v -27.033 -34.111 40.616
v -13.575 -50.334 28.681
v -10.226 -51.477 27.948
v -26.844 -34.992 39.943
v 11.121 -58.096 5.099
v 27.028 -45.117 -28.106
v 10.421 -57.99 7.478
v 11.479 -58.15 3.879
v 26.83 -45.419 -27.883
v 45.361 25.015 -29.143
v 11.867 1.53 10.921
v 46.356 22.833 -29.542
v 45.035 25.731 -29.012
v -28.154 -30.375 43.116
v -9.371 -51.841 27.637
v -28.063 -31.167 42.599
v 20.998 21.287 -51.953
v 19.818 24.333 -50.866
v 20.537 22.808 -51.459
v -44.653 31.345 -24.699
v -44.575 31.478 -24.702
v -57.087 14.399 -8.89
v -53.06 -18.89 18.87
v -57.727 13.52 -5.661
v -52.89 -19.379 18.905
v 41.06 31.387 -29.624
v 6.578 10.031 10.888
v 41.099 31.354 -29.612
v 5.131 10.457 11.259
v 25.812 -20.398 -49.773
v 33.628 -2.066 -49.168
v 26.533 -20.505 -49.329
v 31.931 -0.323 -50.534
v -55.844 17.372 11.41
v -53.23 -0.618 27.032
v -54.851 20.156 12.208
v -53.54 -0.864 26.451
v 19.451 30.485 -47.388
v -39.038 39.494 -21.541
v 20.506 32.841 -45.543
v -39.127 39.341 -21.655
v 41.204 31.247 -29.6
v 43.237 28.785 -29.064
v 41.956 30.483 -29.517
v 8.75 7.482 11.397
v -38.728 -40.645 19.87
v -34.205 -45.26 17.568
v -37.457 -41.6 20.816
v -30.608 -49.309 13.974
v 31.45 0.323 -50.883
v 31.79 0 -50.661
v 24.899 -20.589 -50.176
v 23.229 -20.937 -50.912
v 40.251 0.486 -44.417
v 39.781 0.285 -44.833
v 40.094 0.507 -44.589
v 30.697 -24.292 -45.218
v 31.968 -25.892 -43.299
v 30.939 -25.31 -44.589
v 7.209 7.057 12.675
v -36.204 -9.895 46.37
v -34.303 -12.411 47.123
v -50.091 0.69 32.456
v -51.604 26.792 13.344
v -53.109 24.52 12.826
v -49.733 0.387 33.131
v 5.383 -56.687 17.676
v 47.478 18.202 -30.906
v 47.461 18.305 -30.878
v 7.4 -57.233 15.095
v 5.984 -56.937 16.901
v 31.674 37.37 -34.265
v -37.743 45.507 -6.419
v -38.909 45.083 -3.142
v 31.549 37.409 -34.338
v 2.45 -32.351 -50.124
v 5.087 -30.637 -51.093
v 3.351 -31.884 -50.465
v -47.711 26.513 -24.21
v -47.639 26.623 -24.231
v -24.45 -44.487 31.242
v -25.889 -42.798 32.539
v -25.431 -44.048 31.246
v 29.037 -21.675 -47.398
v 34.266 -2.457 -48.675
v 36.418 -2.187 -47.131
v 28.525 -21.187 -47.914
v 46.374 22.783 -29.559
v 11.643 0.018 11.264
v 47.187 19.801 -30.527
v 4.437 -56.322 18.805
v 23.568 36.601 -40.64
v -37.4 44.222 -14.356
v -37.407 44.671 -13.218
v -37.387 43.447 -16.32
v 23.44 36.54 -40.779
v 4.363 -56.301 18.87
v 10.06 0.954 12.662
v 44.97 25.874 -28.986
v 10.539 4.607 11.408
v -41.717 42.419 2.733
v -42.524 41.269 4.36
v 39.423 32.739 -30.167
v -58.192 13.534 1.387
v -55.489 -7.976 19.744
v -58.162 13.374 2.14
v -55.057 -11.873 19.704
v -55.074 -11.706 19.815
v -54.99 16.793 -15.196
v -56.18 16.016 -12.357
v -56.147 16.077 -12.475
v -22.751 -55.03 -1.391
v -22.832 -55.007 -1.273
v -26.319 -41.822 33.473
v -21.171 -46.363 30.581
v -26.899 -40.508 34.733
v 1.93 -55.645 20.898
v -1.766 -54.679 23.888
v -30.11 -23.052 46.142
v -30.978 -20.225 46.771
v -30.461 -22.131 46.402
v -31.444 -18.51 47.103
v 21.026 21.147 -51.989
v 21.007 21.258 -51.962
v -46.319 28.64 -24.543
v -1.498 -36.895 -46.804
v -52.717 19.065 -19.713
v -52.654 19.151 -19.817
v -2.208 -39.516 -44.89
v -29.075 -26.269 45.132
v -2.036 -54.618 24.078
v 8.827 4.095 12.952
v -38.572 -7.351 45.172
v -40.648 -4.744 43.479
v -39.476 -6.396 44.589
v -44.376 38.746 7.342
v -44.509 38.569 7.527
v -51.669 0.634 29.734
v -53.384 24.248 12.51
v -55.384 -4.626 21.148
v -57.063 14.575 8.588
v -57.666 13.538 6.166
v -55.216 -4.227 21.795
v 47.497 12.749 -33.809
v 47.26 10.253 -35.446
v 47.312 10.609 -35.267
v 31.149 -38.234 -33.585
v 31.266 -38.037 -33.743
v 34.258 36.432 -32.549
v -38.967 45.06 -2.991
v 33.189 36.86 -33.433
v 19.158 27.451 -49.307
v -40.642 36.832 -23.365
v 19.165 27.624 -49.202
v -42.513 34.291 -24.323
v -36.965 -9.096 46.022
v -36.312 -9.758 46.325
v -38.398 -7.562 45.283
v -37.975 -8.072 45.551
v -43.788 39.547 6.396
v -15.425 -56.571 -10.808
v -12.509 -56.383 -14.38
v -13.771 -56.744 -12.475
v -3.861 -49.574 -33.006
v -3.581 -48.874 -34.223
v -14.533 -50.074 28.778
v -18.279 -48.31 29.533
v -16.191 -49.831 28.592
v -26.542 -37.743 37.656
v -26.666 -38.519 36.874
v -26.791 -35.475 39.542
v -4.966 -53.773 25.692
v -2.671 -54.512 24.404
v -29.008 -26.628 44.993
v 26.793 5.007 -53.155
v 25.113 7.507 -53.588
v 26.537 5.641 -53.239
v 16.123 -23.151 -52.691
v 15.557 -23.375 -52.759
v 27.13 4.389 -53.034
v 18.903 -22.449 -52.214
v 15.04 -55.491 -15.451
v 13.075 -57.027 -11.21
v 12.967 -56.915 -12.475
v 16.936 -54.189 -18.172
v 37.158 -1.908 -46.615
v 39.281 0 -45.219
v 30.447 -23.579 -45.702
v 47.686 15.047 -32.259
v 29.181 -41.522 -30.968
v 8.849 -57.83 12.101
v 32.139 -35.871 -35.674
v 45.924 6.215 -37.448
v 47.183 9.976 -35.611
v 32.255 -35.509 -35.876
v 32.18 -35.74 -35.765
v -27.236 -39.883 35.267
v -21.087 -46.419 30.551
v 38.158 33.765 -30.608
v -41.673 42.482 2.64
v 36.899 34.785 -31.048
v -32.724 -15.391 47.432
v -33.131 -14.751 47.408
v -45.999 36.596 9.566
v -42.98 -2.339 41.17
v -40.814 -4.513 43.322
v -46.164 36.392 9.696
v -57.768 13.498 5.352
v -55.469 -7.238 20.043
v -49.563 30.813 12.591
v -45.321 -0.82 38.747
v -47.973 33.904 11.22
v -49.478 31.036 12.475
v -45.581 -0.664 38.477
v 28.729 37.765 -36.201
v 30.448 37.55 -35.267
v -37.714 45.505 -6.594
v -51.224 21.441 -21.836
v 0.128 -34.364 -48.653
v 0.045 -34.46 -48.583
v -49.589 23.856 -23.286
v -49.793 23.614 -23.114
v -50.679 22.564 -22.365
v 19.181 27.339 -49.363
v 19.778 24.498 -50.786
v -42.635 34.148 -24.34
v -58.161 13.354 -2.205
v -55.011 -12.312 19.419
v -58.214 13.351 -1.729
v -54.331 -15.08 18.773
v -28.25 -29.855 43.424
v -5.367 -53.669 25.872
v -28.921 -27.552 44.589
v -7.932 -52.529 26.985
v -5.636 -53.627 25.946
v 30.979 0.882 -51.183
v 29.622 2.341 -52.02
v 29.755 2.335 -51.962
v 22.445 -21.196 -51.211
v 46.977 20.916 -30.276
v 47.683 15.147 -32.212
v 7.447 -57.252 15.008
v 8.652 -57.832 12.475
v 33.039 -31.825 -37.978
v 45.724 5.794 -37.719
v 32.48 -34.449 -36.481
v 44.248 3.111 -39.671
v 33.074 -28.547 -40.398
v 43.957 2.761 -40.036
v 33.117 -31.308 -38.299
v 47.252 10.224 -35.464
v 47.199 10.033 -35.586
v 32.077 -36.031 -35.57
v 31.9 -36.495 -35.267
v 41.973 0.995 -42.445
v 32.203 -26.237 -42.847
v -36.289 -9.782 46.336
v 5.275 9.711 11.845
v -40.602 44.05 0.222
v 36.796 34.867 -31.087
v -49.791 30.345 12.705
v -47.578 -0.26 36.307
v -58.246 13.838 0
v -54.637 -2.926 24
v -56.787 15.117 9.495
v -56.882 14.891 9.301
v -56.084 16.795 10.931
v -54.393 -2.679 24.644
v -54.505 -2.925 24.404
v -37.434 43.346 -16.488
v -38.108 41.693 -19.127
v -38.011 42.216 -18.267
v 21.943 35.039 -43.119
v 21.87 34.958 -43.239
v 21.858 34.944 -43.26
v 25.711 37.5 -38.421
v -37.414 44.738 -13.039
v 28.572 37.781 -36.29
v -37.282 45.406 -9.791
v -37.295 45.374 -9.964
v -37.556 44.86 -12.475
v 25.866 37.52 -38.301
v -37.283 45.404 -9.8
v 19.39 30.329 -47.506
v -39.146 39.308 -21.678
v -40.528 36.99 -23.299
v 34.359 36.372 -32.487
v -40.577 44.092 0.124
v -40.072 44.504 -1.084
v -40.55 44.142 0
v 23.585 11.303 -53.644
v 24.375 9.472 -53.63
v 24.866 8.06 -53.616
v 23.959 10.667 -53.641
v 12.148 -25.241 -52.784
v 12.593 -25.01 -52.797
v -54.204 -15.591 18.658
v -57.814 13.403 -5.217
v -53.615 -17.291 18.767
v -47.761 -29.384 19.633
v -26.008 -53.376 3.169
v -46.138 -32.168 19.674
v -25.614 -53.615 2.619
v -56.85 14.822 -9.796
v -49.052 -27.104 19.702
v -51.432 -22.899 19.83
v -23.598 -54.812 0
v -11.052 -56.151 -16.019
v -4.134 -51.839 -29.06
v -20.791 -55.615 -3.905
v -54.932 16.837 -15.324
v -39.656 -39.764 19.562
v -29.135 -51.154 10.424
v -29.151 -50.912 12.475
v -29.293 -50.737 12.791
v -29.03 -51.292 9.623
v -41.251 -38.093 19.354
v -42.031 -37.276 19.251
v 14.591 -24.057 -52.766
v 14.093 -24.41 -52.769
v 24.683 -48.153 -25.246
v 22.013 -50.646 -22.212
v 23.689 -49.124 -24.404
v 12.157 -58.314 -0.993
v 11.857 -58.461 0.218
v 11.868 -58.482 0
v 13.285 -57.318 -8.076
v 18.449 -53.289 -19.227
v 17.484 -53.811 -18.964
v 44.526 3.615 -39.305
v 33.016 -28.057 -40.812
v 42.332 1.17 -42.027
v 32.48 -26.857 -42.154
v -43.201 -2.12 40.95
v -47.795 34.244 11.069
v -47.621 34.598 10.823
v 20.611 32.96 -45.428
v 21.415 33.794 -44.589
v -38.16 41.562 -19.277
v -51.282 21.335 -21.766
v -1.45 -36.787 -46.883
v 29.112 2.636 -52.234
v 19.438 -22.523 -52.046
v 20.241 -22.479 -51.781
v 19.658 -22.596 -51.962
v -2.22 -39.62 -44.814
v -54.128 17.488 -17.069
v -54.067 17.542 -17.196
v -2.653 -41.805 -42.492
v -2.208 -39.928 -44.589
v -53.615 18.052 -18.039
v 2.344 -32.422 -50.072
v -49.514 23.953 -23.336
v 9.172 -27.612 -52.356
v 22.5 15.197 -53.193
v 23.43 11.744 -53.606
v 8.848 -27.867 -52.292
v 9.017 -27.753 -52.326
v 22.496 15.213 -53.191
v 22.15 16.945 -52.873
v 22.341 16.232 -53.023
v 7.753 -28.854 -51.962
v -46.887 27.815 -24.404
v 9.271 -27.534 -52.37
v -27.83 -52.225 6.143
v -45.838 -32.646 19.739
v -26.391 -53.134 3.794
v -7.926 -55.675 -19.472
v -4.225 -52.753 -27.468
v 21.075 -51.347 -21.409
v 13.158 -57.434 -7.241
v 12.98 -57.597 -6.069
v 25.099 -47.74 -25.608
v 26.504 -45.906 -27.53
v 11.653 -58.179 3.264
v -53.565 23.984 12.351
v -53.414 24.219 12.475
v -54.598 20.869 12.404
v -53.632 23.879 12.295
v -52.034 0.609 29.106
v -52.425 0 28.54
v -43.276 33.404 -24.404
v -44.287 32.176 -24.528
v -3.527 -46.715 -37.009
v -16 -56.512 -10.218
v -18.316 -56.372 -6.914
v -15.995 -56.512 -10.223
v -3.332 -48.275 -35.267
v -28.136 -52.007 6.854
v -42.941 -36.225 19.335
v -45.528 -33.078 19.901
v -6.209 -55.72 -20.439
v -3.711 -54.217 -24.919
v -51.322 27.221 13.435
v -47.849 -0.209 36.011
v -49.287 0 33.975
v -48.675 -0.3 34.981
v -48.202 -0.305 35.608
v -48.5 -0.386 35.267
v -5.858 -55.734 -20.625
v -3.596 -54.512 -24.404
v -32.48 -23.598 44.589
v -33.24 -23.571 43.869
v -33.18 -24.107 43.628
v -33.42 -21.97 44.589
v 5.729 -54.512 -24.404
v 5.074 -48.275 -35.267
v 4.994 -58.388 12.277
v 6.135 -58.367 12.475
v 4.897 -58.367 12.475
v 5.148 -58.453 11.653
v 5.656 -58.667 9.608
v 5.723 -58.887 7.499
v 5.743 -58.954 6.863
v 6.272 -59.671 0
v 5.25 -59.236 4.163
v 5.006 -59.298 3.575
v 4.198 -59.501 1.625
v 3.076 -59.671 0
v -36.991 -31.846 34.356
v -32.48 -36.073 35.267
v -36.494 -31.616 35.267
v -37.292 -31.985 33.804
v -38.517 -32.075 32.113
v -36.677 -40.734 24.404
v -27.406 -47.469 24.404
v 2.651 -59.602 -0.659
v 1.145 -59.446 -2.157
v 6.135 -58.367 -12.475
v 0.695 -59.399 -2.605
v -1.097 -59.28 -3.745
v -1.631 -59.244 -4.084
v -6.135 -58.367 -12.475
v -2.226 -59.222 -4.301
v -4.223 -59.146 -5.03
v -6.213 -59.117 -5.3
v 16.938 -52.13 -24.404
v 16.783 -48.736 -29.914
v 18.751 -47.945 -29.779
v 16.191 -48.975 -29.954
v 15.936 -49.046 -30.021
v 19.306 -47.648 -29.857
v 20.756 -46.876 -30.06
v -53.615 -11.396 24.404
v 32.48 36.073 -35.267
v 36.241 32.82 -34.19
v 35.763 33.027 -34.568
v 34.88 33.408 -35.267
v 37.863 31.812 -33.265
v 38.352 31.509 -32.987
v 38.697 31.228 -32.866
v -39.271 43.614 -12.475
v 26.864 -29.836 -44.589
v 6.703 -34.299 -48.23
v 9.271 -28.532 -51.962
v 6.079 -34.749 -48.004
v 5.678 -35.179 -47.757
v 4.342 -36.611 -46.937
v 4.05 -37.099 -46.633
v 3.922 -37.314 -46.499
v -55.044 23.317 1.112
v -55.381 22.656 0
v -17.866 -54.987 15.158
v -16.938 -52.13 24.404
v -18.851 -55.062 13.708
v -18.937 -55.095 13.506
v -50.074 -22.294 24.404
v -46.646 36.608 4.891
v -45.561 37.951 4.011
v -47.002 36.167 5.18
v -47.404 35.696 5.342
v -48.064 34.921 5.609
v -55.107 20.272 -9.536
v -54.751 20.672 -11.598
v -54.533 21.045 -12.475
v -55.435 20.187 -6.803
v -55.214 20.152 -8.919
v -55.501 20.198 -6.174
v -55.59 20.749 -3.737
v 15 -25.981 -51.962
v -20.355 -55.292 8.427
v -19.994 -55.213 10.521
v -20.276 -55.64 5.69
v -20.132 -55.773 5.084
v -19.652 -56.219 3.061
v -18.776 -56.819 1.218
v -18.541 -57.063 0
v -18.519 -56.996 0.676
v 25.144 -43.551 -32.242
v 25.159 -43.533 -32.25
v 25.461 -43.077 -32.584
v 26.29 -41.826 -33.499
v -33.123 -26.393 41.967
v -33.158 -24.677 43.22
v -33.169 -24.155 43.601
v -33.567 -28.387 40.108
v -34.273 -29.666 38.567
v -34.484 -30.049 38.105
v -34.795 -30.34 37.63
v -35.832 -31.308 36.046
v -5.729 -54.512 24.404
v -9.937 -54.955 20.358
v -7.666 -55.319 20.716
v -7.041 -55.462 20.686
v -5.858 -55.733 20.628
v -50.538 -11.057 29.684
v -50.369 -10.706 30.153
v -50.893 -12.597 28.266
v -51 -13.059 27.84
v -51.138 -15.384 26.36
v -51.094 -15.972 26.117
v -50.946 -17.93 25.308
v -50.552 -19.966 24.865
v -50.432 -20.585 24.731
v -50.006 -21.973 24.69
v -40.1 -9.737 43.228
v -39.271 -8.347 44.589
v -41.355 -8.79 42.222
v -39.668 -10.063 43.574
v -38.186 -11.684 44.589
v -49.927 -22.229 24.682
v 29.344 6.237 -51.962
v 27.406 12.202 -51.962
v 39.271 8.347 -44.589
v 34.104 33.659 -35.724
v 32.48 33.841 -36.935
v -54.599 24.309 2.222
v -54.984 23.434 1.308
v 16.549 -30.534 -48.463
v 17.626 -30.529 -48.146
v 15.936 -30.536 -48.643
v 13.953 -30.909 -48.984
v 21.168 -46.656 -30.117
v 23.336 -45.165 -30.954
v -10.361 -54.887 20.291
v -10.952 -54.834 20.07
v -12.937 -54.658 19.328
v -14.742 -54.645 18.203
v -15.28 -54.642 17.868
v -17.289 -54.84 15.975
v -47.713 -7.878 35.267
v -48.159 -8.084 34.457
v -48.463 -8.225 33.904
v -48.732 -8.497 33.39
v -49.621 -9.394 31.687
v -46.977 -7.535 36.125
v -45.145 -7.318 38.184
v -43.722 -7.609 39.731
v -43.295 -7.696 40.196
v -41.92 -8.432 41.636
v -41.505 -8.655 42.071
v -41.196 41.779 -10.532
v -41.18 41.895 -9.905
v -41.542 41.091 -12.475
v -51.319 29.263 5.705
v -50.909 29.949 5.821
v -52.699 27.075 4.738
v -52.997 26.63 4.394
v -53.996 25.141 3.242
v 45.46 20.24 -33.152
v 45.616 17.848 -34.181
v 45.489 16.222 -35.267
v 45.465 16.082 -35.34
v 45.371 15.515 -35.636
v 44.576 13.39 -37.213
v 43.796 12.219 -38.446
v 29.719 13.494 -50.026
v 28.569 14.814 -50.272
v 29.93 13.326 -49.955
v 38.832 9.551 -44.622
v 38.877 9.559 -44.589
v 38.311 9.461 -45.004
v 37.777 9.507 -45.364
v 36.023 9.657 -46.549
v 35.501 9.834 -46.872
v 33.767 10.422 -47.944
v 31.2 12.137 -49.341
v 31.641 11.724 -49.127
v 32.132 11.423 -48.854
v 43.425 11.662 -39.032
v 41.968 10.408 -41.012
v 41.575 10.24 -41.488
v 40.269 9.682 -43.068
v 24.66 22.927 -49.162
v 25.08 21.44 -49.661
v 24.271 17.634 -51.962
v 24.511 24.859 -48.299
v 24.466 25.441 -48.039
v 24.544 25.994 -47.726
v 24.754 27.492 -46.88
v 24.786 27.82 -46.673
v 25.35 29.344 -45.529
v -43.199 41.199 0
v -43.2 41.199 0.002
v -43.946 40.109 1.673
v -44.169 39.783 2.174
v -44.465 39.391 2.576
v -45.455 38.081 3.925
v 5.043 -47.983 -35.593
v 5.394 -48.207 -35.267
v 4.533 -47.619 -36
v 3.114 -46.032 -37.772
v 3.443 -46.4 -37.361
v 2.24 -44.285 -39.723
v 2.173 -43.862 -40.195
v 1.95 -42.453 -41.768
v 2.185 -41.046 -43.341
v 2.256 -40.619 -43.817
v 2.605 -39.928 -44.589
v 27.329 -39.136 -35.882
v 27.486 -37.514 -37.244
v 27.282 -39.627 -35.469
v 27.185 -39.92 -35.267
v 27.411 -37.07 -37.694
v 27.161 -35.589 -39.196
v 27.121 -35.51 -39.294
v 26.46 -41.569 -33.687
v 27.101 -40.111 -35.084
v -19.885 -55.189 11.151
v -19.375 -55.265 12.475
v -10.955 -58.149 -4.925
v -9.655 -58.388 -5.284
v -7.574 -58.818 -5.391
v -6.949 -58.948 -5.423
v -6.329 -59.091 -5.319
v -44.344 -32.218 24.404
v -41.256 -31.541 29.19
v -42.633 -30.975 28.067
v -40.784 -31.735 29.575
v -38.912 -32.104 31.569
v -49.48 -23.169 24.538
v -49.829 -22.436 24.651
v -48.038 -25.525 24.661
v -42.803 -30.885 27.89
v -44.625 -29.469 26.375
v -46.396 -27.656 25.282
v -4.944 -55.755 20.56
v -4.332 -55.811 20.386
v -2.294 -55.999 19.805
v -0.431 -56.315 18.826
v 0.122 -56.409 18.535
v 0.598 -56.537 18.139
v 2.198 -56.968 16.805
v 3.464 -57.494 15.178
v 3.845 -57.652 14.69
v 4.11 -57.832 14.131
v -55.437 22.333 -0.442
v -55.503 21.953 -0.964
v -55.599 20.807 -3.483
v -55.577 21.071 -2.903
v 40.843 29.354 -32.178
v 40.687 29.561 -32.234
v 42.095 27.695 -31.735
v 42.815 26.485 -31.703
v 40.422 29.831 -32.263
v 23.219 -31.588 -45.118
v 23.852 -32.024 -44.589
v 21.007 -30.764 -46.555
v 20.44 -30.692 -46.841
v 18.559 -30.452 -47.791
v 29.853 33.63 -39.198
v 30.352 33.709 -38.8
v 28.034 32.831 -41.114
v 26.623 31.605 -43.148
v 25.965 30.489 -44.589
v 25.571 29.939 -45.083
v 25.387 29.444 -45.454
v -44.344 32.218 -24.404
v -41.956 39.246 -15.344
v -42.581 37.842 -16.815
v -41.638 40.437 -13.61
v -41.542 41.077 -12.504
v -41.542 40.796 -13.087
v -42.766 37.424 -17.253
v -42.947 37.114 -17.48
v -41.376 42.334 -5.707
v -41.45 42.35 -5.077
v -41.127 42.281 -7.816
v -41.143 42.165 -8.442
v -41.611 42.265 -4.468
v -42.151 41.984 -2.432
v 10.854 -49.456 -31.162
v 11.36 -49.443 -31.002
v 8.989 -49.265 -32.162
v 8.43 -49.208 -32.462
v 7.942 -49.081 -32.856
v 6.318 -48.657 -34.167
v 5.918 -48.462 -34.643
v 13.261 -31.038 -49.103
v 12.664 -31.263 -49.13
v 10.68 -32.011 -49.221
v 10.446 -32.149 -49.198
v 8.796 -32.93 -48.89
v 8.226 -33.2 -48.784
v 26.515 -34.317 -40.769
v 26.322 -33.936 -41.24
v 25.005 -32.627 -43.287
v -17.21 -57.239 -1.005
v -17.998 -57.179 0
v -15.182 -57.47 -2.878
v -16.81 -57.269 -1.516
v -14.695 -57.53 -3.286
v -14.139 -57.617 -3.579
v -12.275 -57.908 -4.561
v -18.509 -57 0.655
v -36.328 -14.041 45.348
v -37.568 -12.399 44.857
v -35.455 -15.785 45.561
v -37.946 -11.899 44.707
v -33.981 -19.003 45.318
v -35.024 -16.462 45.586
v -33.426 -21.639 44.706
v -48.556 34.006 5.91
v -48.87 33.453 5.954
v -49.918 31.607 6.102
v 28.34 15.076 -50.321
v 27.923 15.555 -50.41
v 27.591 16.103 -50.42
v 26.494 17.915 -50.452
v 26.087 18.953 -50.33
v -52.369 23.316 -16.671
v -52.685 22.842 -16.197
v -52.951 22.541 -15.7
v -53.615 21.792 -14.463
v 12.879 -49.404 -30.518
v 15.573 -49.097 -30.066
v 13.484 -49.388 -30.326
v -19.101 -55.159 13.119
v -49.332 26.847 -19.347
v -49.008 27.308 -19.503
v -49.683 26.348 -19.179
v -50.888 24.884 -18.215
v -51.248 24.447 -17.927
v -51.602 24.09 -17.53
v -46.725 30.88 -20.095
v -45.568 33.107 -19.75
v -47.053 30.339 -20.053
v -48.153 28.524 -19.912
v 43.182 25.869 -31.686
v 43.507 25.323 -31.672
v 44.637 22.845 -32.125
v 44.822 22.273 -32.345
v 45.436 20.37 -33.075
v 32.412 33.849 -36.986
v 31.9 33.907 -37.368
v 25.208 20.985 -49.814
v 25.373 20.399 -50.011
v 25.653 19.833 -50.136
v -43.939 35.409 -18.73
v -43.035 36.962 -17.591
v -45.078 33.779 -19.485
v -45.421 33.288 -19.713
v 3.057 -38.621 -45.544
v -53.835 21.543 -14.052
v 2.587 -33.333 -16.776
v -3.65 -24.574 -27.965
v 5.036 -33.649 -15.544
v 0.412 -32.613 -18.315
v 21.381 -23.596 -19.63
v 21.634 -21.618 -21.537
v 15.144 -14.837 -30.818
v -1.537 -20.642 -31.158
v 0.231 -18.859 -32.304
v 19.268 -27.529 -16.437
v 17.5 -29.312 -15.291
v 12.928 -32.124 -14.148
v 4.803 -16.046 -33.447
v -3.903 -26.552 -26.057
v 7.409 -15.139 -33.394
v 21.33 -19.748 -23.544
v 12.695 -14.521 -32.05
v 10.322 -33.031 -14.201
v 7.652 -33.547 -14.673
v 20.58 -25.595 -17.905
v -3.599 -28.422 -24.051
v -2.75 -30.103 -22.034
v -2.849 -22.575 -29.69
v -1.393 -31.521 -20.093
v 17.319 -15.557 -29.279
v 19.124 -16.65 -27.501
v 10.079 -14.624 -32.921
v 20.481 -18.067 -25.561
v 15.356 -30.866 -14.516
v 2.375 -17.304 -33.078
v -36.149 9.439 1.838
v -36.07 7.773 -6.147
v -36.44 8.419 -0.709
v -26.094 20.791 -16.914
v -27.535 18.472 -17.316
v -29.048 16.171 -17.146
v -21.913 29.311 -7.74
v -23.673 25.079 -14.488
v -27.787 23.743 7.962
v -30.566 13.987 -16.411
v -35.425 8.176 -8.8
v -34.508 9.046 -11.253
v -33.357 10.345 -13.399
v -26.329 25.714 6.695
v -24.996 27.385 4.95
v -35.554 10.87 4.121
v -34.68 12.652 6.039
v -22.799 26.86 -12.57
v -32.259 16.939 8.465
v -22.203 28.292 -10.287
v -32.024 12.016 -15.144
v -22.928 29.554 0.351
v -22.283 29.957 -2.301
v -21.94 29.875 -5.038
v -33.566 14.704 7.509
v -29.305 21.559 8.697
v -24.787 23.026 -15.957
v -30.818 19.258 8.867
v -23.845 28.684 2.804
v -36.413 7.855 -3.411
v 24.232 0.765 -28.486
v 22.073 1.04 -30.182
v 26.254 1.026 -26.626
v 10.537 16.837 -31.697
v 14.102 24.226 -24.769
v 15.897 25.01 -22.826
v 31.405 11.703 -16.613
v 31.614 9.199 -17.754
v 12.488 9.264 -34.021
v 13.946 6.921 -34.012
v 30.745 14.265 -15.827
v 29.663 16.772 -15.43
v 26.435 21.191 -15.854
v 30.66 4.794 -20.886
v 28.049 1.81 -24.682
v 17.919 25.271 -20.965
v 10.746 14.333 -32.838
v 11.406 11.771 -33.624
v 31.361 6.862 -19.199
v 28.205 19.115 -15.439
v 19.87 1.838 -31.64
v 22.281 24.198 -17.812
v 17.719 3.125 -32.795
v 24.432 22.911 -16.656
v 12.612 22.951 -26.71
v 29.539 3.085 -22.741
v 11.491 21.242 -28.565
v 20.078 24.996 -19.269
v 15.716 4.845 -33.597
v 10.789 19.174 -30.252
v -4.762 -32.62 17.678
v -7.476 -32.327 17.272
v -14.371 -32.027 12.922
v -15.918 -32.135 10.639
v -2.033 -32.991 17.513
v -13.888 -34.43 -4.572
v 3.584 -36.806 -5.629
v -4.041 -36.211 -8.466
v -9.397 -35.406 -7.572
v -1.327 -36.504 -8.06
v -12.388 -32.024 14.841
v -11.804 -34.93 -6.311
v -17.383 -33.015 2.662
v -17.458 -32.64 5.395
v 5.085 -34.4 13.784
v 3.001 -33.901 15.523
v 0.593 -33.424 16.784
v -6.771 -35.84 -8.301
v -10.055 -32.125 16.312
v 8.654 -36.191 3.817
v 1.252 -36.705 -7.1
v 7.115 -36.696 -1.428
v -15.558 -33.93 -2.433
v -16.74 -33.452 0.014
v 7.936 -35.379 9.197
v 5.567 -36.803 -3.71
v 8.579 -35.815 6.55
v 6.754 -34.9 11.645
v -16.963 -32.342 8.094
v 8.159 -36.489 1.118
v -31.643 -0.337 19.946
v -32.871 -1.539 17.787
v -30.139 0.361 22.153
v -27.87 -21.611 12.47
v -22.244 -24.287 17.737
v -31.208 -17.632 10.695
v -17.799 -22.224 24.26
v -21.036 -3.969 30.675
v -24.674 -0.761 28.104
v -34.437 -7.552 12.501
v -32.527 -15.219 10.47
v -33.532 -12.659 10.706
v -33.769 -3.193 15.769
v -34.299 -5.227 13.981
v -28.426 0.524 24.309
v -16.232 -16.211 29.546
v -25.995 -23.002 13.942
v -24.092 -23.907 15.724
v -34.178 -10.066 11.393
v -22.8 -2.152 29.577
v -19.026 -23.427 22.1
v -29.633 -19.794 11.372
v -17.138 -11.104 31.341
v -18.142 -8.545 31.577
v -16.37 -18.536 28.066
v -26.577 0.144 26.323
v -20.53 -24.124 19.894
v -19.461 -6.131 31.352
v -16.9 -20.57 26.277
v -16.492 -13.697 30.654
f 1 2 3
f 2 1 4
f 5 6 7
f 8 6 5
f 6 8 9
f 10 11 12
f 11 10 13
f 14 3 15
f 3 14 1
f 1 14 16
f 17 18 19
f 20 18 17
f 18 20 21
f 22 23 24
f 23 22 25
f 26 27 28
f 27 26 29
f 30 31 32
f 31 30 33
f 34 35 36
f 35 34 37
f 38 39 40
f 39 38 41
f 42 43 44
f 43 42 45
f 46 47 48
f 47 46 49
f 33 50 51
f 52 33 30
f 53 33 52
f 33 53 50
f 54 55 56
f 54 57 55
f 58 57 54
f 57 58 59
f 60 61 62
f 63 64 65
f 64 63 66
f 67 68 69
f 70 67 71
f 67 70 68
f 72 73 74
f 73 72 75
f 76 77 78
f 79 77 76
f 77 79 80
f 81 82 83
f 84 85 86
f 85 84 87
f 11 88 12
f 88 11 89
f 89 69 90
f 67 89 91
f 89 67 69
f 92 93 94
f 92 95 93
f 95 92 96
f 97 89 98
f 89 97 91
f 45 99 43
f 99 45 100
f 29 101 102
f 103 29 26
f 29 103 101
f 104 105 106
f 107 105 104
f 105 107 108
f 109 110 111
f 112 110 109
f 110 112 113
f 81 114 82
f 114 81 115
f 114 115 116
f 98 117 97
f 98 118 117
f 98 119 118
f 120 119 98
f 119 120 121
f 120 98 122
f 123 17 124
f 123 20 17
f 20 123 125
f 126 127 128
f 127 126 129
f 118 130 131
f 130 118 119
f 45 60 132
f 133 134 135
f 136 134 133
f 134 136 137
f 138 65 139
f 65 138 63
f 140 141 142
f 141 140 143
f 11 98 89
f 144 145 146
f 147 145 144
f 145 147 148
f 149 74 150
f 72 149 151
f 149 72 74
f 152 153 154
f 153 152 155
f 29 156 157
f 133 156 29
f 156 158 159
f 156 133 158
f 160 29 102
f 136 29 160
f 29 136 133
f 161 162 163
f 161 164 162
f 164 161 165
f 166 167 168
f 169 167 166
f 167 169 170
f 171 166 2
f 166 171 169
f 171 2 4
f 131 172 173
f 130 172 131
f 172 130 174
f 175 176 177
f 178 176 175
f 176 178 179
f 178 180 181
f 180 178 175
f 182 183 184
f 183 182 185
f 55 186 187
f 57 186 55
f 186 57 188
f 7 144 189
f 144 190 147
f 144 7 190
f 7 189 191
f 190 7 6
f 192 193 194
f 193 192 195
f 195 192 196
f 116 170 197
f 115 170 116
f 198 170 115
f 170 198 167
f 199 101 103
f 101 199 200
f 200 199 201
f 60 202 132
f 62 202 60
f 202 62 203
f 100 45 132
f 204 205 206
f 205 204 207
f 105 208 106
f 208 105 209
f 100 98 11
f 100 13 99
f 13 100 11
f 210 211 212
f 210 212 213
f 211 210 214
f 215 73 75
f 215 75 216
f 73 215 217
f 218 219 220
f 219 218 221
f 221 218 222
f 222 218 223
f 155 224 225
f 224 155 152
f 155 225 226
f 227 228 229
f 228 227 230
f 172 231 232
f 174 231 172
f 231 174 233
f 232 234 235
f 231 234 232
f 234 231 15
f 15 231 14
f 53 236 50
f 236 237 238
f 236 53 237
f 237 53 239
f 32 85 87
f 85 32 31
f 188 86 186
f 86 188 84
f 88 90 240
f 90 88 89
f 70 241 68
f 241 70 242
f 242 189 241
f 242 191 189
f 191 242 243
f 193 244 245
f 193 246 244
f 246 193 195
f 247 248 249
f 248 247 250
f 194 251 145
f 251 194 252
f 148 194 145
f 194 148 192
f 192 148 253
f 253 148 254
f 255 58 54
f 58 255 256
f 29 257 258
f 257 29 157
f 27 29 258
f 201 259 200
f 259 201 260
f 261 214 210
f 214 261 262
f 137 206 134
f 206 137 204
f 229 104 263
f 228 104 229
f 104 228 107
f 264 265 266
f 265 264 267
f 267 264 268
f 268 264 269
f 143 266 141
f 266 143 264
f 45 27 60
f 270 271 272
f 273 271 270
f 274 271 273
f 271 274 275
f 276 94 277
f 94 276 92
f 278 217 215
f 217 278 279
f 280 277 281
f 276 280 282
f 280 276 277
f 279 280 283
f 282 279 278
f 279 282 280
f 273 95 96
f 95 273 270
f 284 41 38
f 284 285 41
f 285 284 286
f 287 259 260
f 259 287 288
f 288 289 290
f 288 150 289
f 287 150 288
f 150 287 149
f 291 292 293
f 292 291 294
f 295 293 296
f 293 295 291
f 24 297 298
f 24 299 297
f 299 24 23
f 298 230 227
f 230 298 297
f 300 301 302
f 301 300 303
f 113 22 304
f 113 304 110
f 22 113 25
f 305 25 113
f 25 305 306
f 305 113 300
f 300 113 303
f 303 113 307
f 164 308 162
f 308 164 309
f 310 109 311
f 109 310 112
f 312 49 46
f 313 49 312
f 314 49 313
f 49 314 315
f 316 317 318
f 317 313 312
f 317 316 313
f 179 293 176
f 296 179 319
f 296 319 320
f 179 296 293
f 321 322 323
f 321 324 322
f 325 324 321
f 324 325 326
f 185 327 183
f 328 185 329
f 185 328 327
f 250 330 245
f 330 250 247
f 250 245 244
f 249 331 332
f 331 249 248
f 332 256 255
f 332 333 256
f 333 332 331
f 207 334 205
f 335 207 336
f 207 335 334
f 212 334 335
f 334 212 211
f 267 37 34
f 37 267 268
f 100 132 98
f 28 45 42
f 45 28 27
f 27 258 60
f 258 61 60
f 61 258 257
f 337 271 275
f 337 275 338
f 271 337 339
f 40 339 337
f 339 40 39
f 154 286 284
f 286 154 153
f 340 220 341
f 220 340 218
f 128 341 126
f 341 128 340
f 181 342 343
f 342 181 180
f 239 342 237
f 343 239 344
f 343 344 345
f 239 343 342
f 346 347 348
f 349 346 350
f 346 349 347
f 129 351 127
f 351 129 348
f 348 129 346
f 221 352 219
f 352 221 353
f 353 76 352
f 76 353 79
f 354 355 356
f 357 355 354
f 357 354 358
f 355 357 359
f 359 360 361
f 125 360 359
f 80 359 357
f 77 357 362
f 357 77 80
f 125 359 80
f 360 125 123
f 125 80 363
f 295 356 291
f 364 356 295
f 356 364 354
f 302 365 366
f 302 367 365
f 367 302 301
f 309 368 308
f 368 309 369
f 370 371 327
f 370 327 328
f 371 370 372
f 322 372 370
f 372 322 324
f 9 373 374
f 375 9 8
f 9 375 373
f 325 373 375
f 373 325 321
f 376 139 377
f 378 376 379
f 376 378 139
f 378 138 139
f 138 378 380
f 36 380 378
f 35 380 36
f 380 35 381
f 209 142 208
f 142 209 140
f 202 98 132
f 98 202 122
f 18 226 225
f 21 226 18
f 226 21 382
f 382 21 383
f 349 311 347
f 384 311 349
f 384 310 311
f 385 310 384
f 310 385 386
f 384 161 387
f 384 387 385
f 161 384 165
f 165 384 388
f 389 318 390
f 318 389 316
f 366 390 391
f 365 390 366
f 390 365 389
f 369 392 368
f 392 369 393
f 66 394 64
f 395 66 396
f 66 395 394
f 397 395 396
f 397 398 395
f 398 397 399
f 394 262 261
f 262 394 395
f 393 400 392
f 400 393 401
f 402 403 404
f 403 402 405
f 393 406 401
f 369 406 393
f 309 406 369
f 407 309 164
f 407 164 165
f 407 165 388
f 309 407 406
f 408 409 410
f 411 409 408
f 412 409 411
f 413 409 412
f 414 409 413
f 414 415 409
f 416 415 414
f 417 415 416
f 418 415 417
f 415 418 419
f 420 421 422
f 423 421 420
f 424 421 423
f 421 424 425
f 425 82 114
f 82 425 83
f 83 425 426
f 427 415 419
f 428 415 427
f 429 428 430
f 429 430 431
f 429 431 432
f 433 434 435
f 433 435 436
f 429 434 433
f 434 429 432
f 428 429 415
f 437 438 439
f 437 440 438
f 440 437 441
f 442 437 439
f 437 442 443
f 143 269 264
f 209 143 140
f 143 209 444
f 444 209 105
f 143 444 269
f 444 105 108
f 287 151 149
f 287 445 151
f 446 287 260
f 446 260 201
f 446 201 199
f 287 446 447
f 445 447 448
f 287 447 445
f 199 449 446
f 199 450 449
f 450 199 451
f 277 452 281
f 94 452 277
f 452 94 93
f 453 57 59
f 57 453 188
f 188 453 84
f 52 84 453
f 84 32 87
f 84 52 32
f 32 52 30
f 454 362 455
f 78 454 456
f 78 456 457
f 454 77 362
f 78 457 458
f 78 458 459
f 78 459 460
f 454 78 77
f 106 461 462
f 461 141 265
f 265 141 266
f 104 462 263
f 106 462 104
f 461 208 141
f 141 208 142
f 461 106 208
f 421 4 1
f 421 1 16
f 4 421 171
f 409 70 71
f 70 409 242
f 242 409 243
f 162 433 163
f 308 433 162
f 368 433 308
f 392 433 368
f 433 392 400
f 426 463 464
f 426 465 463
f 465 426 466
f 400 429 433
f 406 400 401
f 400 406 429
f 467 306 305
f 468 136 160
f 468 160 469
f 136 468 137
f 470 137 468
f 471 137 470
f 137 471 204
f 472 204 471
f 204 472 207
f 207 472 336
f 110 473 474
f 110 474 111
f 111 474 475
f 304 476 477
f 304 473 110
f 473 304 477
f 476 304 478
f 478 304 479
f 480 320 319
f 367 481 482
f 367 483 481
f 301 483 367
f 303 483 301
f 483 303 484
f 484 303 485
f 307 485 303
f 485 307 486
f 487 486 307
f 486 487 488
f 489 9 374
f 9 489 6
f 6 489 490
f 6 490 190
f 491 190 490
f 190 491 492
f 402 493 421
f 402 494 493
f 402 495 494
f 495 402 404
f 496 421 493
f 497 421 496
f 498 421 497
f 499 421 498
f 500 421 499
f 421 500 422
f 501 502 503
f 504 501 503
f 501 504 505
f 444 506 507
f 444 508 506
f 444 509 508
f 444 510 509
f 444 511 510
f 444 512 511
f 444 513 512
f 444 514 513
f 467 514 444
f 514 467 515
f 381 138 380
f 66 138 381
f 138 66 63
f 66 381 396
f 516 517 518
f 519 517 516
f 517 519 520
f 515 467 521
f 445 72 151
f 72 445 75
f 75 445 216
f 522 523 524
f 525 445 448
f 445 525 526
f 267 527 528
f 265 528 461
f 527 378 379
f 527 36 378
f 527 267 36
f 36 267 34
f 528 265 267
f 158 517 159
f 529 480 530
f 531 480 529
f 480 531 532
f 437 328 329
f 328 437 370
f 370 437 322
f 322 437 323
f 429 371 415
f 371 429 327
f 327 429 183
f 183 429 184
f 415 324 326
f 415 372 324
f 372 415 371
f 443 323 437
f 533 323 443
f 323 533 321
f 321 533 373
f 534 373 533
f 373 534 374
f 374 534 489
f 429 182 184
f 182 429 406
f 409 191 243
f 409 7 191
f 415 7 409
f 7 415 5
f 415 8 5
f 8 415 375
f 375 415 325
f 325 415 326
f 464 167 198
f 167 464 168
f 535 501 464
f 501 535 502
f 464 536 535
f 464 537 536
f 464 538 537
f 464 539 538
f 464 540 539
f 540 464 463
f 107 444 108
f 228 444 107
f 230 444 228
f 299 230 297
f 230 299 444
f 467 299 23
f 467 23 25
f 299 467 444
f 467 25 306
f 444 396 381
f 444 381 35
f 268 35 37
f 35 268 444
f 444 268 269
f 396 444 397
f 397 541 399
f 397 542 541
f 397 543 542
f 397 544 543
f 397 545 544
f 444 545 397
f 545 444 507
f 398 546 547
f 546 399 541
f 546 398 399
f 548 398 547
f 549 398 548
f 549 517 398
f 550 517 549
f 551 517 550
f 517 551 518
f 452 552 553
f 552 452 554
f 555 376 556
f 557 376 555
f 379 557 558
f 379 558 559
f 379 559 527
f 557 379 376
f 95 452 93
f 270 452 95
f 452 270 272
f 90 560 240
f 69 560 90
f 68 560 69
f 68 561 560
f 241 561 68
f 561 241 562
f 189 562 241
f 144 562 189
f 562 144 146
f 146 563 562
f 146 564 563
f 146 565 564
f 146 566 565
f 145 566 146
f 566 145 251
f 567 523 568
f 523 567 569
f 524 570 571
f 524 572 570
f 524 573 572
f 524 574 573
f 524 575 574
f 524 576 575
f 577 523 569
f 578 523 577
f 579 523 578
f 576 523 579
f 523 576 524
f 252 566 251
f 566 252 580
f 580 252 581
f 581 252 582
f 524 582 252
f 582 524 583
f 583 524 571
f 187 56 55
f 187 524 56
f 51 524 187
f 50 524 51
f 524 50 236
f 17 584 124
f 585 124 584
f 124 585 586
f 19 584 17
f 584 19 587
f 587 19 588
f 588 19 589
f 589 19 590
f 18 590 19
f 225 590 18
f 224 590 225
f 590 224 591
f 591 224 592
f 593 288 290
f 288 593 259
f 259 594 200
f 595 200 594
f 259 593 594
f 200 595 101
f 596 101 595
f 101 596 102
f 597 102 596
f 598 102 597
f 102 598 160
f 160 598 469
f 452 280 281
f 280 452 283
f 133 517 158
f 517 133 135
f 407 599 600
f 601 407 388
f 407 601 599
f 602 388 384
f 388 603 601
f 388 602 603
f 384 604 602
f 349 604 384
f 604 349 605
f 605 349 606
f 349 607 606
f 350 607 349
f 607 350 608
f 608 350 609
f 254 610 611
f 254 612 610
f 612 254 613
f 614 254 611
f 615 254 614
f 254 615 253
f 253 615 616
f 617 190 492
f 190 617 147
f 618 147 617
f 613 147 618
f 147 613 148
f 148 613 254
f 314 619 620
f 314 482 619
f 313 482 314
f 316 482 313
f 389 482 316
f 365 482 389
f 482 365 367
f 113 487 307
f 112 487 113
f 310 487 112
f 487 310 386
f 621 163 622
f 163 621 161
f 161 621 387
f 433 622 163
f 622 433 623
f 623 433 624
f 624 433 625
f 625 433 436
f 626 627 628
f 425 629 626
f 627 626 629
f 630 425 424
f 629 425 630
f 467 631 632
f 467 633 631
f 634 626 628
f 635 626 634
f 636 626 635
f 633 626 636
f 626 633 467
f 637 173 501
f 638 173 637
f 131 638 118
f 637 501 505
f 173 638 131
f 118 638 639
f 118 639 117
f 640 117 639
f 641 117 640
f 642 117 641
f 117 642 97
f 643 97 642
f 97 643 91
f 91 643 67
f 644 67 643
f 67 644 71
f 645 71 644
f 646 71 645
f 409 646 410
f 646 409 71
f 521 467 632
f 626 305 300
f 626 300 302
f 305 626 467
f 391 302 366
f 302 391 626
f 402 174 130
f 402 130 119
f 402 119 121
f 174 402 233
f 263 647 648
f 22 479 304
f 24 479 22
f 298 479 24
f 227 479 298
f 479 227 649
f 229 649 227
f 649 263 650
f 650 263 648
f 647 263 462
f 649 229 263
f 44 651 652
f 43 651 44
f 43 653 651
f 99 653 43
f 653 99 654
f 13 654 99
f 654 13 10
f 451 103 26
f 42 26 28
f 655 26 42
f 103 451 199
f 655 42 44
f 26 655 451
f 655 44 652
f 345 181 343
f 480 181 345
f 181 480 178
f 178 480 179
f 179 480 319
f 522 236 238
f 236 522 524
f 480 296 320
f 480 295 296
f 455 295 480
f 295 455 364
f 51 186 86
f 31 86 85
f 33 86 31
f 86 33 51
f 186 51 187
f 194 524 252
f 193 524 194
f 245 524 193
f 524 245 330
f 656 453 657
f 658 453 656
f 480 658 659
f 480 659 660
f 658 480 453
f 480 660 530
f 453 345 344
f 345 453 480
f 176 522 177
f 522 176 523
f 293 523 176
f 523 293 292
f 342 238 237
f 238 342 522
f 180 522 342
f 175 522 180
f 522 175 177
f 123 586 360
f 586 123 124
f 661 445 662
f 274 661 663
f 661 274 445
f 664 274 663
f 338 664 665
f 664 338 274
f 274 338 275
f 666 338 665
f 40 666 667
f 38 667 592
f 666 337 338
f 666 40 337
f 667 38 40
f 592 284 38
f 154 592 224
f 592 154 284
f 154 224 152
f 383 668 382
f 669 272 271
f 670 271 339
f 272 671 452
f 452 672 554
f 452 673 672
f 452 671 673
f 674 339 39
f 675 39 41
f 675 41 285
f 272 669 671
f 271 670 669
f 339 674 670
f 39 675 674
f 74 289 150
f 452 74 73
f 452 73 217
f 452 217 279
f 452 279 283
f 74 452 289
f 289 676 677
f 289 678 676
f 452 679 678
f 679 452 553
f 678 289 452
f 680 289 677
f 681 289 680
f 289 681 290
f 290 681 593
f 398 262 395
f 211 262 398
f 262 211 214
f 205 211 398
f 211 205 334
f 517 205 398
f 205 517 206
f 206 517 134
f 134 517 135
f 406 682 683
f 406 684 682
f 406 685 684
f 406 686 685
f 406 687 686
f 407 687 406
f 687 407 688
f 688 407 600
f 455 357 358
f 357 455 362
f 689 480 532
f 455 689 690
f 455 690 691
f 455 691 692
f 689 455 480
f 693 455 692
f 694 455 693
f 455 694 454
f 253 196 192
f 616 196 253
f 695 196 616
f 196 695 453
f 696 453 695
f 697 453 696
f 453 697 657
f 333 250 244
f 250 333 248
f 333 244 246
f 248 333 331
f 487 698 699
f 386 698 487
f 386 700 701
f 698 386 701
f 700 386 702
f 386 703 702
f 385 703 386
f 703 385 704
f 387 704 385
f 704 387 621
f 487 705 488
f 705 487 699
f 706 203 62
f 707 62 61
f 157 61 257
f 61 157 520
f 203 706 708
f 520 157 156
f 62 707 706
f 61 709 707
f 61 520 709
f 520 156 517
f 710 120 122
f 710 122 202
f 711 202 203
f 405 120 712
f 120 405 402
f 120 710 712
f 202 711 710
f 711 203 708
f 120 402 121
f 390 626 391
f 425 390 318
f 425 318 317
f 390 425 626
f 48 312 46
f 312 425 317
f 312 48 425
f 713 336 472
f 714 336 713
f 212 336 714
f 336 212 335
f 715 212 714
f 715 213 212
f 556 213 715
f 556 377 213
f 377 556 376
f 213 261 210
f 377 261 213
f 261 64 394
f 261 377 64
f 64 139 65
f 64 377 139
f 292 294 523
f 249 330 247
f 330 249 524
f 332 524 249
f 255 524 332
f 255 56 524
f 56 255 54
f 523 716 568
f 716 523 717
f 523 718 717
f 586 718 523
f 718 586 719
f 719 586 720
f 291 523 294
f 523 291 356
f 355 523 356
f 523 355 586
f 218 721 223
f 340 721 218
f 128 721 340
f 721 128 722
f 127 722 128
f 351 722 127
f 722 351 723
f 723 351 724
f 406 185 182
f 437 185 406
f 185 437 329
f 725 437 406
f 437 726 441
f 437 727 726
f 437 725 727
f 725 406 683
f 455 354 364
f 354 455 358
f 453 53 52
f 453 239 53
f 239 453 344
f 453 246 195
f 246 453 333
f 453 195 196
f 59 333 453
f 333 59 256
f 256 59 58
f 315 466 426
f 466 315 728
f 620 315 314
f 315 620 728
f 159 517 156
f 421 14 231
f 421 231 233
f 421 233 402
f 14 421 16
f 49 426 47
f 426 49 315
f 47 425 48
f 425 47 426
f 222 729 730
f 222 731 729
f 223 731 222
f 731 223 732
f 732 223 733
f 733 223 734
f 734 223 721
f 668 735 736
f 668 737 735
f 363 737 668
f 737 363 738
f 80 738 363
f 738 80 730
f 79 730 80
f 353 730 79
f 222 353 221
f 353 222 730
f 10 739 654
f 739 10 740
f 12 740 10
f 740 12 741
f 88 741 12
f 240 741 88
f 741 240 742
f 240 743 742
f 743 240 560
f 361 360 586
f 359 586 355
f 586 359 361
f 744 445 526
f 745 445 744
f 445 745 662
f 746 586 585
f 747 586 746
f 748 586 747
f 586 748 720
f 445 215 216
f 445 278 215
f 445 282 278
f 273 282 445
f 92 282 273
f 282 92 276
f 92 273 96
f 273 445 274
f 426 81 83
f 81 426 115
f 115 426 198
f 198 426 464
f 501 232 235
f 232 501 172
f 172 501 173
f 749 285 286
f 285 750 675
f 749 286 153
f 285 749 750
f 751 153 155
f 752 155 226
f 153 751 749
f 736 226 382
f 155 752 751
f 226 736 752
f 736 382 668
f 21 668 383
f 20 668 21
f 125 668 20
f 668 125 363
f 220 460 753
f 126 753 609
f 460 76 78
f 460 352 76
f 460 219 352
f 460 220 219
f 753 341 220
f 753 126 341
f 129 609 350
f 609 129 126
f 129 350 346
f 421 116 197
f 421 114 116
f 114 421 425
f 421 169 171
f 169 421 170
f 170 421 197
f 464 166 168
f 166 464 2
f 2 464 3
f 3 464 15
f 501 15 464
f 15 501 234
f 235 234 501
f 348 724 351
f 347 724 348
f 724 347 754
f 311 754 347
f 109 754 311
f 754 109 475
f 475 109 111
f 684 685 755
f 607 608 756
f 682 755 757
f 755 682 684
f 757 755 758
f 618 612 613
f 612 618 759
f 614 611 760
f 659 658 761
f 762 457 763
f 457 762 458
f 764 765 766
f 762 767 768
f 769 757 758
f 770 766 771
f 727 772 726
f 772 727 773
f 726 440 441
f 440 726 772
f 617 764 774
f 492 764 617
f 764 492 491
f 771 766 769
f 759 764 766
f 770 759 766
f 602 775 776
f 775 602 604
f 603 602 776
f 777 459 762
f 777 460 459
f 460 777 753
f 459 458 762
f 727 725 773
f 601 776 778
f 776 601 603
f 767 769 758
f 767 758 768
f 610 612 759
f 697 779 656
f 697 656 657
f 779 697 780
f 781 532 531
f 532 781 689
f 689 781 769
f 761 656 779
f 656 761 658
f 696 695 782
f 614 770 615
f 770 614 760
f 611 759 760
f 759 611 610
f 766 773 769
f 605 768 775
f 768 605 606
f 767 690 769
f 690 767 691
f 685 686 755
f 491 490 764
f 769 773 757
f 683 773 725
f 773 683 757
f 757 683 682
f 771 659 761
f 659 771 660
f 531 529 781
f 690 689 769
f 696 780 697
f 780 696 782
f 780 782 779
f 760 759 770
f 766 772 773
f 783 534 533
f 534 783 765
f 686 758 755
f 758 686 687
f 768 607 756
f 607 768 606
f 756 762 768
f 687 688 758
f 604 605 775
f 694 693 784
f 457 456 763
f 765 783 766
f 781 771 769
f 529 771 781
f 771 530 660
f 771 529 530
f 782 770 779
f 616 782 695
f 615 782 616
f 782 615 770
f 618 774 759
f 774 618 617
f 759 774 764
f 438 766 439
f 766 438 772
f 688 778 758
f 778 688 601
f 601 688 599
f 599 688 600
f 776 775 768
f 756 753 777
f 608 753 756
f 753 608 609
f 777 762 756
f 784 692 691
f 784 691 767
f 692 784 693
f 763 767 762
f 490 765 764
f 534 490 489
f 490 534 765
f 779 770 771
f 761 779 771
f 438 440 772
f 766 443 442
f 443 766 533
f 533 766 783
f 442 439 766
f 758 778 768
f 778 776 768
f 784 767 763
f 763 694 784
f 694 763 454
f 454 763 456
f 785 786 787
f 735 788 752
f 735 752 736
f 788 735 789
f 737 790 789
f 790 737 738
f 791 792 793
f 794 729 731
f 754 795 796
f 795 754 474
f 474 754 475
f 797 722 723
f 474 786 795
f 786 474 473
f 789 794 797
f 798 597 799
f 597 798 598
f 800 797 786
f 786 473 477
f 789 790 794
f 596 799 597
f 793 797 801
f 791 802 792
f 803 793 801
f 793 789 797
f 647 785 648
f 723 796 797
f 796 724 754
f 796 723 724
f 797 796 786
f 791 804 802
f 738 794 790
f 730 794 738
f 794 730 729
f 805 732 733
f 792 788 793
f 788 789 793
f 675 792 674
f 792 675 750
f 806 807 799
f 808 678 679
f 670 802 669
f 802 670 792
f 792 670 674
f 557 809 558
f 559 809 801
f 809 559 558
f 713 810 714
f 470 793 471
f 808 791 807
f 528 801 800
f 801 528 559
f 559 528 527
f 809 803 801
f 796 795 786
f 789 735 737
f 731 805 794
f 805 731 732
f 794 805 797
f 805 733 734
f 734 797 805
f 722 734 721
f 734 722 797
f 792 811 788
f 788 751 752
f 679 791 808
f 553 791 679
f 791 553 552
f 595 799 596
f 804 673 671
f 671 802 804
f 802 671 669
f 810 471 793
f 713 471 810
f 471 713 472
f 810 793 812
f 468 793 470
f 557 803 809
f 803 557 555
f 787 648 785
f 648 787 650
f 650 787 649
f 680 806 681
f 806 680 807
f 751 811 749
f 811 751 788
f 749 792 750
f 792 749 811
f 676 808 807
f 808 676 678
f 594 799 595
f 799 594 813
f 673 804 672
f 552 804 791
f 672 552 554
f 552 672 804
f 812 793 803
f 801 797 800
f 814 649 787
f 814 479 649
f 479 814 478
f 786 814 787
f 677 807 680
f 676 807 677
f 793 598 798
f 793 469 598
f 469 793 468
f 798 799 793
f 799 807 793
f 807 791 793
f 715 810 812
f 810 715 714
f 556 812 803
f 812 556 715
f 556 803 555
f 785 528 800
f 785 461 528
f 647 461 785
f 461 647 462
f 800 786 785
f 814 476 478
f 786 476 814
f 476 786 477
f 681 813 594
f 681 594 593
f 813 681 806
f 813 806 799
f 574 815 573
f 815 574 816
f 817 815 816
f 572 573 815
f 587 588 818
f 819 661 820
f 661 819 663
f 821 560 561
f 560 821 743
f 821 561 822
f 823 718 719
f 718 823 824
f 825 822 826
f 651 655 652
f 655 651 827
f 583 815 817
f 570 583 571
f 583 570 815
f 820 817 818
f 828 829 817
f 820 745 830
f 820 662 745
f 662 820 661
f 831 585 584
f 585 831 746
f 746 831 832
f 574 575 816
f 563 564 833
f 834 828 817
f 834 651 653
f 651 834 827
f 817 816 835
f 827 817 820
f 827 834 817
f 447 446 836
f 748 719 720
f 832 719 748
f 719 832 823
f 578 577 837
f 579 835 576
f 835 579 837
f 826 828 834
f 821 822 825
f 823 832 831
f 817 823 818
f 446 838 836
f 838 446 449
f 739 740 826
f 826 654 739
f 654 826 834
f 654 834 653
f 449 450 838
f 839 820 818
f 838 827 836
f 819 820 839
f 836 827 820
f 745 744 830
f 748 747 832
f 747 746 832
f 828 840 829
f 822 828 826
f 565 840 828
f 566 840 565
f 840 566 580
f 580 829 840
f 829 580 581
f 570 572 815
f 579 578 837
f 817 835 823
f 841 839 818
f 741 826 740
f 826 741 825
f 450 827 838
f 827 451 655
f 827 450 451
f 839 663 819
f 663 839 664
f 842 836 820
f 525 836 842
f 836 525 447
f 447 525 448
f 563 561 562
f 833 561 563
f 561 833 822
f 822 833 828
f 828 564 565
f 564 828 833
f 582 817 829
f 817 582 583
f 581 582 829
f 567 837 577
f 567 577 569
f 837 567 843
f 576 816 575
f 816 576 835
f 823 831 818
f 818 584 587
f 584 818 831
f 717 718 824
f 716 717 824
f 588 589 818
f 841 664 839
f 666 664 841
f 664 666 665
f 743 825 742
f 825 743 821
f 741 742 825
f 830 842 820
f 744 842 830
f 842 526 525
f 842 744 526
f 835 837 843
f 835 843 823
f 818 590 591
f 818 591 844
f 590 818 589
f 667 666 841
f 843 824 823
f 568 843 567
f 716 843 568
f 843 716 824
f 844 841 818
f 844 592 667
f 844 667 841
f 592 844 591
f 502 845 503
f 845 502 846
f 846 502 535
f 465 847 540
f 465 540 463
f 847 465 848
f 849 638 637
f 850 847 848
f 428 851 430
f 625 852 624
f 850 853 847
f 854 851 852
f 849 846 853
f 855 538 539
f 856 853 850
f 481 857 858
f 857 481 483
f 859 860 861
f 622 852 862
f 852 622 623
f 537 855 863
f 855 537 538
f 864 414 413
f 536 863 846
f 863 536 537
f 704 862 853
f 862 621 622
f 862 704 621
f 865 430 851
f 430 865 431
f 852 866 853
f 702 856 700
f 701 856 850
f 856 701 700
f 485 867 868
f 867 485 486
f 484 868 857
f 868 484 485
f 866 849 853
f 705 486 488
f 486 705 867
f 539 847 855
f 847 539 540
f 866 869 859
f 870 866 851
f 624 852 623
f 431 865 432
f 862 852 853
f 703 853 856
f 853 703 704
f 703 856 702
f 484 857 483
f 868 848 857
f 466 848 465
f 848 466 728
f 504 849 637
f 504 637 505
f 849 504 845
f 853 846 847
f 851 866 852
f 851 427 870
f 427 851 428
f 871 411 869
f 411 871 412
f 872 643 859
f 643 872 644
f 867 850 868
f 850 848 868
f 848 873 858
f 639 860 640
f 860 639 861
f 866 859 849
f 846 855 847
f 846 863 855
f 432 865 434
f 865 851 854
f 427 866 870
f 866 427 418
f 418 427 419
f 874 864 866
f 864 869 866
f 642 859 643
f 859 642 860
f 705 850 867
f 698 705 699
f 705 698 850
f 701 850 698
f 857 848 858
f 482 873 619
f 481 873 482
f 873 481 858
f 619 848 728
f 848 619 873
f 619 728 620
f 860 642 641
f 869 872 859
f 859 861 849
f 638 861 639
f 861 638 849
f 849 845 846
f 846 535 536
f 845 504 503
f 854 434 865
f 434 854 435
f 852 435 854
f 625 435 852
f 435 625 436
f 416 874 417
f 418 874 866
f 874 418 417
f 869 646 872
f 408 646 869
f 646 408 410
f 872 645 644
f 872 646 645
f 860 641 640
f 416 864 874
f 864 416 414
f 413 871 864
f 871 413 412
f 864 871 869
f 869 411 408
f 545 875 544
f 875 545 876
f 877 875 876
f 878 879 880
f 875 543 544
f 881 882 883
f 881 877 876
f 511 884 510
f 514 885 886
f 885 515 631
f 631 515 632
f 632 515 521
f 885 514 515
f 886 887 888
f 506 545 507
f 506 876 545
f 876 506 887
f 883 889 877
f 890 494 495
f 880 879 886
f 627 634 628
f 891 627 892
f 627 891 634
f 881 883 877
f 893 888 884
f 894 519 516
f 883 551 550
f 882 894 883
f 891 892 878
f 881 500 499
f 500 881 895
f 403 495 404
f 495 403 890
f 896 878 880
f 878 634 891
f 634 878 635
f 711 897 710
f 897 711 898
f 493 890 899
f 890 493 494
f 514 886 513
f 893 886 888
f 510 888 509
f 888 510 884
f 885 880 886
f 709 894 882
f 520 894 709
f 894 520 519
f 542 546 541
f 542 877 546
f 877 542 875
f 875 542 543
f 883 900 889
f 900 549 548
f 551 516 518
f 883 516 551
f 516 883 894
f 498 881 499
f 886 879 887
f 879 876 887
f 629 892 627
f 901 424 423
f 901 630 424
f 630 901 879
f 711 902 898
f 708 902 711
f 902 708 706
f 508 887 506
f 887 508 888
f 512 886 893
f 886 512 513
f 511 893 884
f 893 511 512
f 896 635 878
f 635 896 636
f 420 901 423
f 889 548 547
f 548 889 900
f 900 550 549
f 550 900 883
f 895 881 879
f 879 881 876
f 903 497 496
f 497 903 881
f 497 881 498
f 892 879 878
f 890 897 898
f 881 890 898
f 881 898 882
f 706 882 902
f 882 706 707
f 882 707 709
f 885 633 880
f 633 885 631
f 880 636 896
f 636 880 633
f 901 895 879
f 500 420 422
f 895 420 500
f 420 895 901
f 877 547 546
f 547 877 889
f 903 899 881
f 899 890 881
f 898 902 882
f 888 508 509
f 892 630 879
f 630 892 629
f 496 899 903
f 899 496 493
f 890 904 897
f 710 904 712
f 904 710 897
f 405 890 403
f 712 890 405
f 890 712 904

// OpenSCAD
difference() {
	intersection() {
		hull() {
			rotate(a = -120.3141209556, v = [0.6897763572, -0.5190815997, 0.0000000000]) {
				rotate(a = -90.0000000000, v = [0.2588190451, -0.9659258263, 0.0000000000]) {
					cylinder(h = 60, r = 16.2000000000);
				}
			}
			rotate(a = -120.3141209556, v = [0.6897763572, -0.5190815997, 0.0000000000]) {
				rotate(a = -90.0000000000, v = [0.7071067812, 0.7071067812, -0.0000000000]) {
					cylinder(h = 60, r = 16.2000000000);
				}
			}
			rotate(a = -120.3141209556, v = [0.6897763572, -0.5190815997, 0.0000000000]) {
				rotate(a = -22.2263282801, v = [0.0665799897, -0.3723606073, 0.0000000000]) {
					cylinder(h = 60, r = 16.2000000000);
				}
			}
			rotate(a = -120.3141209556, v = [0.6897763572, -0.5190815997, 0.0000000000]) {
				rotate(a = -144.0917087294, v = [-0.0385041896, -0.5852242691, 0.0000000000]) {
					cylinder(h = 60, r = 16.2000000000);
				}
			}
			rotate(a = -120.3141209556, v = [0.6897763572, -0.5190815997, 0.0000000000]) {
				rotate(a = -155.9342565737, v = [0.0956376174, 0.3964110704, -0.0000000000]) {
					cylinder(h = 60, r = 16.2000000000);
				}
			}
		}
		sphere(r = 60);
	}
	union() {
		rotate(a = -120.3141209556, v = [0.6897763572, -0.5190815997, 0.0000000000]) {
			rotate(a = -90.0000000000, v = [0.2588190451, -0.9659258263, 0.0000000000]) {
				translate(v = [0, 0, 35]) {
					cylinder(h = 100, r = 13.2000000000);
				}
			}
		}
		rotate(a = -120.3141209556, v = [0.6897763572, -0.5190815997, 0.0000000000]) {
			rotate(a = -90.0000000000, v = [0.7071067812, 0.7071067812, -0.0000000000]) {
				translate(v = [0, 0, 35]) {
					cylinder(h = 100, r = 13.2000000000);
				}
			}
		}
		rotate(a = -120.3141209556, v = [0.6897763572, -0.5190815997, 0.0000000000]) {
			rotate(a = -22.2263282801, v = [0.0665799897, -0.3723606073, 0.0000000000]) {
				translate(v = [0, 0, 35]) {
					cylinder(h = 100, r = 13.2000000000);
				}
			}
		}
		rotate(a = -120.3141209556, v = [0.6897763572, -0.5190815997, 0.0000000000]) {
			rotate(a = -144.0917087294, v = [-0.0385041896, -0.5852242691, 0.0000000000]) {
				translate(v = [0, 0, 35]) {
					cylinder(h = 100, r = 13.2000000000);
				}
			}
		}
		rotate(a = -120.3141209556, v = [0.6897763572, -0.5190815997, 0.0000000000]) {
			rotate(a = -155.9342565737, v = [0.0956376174, 0.3964110704, -0.0000000000]) {
				translate(v = [0, 0, 35]) {
					cylinder(h = 100, r = 13.2000000000);
				}
			}
		}
	}
}
